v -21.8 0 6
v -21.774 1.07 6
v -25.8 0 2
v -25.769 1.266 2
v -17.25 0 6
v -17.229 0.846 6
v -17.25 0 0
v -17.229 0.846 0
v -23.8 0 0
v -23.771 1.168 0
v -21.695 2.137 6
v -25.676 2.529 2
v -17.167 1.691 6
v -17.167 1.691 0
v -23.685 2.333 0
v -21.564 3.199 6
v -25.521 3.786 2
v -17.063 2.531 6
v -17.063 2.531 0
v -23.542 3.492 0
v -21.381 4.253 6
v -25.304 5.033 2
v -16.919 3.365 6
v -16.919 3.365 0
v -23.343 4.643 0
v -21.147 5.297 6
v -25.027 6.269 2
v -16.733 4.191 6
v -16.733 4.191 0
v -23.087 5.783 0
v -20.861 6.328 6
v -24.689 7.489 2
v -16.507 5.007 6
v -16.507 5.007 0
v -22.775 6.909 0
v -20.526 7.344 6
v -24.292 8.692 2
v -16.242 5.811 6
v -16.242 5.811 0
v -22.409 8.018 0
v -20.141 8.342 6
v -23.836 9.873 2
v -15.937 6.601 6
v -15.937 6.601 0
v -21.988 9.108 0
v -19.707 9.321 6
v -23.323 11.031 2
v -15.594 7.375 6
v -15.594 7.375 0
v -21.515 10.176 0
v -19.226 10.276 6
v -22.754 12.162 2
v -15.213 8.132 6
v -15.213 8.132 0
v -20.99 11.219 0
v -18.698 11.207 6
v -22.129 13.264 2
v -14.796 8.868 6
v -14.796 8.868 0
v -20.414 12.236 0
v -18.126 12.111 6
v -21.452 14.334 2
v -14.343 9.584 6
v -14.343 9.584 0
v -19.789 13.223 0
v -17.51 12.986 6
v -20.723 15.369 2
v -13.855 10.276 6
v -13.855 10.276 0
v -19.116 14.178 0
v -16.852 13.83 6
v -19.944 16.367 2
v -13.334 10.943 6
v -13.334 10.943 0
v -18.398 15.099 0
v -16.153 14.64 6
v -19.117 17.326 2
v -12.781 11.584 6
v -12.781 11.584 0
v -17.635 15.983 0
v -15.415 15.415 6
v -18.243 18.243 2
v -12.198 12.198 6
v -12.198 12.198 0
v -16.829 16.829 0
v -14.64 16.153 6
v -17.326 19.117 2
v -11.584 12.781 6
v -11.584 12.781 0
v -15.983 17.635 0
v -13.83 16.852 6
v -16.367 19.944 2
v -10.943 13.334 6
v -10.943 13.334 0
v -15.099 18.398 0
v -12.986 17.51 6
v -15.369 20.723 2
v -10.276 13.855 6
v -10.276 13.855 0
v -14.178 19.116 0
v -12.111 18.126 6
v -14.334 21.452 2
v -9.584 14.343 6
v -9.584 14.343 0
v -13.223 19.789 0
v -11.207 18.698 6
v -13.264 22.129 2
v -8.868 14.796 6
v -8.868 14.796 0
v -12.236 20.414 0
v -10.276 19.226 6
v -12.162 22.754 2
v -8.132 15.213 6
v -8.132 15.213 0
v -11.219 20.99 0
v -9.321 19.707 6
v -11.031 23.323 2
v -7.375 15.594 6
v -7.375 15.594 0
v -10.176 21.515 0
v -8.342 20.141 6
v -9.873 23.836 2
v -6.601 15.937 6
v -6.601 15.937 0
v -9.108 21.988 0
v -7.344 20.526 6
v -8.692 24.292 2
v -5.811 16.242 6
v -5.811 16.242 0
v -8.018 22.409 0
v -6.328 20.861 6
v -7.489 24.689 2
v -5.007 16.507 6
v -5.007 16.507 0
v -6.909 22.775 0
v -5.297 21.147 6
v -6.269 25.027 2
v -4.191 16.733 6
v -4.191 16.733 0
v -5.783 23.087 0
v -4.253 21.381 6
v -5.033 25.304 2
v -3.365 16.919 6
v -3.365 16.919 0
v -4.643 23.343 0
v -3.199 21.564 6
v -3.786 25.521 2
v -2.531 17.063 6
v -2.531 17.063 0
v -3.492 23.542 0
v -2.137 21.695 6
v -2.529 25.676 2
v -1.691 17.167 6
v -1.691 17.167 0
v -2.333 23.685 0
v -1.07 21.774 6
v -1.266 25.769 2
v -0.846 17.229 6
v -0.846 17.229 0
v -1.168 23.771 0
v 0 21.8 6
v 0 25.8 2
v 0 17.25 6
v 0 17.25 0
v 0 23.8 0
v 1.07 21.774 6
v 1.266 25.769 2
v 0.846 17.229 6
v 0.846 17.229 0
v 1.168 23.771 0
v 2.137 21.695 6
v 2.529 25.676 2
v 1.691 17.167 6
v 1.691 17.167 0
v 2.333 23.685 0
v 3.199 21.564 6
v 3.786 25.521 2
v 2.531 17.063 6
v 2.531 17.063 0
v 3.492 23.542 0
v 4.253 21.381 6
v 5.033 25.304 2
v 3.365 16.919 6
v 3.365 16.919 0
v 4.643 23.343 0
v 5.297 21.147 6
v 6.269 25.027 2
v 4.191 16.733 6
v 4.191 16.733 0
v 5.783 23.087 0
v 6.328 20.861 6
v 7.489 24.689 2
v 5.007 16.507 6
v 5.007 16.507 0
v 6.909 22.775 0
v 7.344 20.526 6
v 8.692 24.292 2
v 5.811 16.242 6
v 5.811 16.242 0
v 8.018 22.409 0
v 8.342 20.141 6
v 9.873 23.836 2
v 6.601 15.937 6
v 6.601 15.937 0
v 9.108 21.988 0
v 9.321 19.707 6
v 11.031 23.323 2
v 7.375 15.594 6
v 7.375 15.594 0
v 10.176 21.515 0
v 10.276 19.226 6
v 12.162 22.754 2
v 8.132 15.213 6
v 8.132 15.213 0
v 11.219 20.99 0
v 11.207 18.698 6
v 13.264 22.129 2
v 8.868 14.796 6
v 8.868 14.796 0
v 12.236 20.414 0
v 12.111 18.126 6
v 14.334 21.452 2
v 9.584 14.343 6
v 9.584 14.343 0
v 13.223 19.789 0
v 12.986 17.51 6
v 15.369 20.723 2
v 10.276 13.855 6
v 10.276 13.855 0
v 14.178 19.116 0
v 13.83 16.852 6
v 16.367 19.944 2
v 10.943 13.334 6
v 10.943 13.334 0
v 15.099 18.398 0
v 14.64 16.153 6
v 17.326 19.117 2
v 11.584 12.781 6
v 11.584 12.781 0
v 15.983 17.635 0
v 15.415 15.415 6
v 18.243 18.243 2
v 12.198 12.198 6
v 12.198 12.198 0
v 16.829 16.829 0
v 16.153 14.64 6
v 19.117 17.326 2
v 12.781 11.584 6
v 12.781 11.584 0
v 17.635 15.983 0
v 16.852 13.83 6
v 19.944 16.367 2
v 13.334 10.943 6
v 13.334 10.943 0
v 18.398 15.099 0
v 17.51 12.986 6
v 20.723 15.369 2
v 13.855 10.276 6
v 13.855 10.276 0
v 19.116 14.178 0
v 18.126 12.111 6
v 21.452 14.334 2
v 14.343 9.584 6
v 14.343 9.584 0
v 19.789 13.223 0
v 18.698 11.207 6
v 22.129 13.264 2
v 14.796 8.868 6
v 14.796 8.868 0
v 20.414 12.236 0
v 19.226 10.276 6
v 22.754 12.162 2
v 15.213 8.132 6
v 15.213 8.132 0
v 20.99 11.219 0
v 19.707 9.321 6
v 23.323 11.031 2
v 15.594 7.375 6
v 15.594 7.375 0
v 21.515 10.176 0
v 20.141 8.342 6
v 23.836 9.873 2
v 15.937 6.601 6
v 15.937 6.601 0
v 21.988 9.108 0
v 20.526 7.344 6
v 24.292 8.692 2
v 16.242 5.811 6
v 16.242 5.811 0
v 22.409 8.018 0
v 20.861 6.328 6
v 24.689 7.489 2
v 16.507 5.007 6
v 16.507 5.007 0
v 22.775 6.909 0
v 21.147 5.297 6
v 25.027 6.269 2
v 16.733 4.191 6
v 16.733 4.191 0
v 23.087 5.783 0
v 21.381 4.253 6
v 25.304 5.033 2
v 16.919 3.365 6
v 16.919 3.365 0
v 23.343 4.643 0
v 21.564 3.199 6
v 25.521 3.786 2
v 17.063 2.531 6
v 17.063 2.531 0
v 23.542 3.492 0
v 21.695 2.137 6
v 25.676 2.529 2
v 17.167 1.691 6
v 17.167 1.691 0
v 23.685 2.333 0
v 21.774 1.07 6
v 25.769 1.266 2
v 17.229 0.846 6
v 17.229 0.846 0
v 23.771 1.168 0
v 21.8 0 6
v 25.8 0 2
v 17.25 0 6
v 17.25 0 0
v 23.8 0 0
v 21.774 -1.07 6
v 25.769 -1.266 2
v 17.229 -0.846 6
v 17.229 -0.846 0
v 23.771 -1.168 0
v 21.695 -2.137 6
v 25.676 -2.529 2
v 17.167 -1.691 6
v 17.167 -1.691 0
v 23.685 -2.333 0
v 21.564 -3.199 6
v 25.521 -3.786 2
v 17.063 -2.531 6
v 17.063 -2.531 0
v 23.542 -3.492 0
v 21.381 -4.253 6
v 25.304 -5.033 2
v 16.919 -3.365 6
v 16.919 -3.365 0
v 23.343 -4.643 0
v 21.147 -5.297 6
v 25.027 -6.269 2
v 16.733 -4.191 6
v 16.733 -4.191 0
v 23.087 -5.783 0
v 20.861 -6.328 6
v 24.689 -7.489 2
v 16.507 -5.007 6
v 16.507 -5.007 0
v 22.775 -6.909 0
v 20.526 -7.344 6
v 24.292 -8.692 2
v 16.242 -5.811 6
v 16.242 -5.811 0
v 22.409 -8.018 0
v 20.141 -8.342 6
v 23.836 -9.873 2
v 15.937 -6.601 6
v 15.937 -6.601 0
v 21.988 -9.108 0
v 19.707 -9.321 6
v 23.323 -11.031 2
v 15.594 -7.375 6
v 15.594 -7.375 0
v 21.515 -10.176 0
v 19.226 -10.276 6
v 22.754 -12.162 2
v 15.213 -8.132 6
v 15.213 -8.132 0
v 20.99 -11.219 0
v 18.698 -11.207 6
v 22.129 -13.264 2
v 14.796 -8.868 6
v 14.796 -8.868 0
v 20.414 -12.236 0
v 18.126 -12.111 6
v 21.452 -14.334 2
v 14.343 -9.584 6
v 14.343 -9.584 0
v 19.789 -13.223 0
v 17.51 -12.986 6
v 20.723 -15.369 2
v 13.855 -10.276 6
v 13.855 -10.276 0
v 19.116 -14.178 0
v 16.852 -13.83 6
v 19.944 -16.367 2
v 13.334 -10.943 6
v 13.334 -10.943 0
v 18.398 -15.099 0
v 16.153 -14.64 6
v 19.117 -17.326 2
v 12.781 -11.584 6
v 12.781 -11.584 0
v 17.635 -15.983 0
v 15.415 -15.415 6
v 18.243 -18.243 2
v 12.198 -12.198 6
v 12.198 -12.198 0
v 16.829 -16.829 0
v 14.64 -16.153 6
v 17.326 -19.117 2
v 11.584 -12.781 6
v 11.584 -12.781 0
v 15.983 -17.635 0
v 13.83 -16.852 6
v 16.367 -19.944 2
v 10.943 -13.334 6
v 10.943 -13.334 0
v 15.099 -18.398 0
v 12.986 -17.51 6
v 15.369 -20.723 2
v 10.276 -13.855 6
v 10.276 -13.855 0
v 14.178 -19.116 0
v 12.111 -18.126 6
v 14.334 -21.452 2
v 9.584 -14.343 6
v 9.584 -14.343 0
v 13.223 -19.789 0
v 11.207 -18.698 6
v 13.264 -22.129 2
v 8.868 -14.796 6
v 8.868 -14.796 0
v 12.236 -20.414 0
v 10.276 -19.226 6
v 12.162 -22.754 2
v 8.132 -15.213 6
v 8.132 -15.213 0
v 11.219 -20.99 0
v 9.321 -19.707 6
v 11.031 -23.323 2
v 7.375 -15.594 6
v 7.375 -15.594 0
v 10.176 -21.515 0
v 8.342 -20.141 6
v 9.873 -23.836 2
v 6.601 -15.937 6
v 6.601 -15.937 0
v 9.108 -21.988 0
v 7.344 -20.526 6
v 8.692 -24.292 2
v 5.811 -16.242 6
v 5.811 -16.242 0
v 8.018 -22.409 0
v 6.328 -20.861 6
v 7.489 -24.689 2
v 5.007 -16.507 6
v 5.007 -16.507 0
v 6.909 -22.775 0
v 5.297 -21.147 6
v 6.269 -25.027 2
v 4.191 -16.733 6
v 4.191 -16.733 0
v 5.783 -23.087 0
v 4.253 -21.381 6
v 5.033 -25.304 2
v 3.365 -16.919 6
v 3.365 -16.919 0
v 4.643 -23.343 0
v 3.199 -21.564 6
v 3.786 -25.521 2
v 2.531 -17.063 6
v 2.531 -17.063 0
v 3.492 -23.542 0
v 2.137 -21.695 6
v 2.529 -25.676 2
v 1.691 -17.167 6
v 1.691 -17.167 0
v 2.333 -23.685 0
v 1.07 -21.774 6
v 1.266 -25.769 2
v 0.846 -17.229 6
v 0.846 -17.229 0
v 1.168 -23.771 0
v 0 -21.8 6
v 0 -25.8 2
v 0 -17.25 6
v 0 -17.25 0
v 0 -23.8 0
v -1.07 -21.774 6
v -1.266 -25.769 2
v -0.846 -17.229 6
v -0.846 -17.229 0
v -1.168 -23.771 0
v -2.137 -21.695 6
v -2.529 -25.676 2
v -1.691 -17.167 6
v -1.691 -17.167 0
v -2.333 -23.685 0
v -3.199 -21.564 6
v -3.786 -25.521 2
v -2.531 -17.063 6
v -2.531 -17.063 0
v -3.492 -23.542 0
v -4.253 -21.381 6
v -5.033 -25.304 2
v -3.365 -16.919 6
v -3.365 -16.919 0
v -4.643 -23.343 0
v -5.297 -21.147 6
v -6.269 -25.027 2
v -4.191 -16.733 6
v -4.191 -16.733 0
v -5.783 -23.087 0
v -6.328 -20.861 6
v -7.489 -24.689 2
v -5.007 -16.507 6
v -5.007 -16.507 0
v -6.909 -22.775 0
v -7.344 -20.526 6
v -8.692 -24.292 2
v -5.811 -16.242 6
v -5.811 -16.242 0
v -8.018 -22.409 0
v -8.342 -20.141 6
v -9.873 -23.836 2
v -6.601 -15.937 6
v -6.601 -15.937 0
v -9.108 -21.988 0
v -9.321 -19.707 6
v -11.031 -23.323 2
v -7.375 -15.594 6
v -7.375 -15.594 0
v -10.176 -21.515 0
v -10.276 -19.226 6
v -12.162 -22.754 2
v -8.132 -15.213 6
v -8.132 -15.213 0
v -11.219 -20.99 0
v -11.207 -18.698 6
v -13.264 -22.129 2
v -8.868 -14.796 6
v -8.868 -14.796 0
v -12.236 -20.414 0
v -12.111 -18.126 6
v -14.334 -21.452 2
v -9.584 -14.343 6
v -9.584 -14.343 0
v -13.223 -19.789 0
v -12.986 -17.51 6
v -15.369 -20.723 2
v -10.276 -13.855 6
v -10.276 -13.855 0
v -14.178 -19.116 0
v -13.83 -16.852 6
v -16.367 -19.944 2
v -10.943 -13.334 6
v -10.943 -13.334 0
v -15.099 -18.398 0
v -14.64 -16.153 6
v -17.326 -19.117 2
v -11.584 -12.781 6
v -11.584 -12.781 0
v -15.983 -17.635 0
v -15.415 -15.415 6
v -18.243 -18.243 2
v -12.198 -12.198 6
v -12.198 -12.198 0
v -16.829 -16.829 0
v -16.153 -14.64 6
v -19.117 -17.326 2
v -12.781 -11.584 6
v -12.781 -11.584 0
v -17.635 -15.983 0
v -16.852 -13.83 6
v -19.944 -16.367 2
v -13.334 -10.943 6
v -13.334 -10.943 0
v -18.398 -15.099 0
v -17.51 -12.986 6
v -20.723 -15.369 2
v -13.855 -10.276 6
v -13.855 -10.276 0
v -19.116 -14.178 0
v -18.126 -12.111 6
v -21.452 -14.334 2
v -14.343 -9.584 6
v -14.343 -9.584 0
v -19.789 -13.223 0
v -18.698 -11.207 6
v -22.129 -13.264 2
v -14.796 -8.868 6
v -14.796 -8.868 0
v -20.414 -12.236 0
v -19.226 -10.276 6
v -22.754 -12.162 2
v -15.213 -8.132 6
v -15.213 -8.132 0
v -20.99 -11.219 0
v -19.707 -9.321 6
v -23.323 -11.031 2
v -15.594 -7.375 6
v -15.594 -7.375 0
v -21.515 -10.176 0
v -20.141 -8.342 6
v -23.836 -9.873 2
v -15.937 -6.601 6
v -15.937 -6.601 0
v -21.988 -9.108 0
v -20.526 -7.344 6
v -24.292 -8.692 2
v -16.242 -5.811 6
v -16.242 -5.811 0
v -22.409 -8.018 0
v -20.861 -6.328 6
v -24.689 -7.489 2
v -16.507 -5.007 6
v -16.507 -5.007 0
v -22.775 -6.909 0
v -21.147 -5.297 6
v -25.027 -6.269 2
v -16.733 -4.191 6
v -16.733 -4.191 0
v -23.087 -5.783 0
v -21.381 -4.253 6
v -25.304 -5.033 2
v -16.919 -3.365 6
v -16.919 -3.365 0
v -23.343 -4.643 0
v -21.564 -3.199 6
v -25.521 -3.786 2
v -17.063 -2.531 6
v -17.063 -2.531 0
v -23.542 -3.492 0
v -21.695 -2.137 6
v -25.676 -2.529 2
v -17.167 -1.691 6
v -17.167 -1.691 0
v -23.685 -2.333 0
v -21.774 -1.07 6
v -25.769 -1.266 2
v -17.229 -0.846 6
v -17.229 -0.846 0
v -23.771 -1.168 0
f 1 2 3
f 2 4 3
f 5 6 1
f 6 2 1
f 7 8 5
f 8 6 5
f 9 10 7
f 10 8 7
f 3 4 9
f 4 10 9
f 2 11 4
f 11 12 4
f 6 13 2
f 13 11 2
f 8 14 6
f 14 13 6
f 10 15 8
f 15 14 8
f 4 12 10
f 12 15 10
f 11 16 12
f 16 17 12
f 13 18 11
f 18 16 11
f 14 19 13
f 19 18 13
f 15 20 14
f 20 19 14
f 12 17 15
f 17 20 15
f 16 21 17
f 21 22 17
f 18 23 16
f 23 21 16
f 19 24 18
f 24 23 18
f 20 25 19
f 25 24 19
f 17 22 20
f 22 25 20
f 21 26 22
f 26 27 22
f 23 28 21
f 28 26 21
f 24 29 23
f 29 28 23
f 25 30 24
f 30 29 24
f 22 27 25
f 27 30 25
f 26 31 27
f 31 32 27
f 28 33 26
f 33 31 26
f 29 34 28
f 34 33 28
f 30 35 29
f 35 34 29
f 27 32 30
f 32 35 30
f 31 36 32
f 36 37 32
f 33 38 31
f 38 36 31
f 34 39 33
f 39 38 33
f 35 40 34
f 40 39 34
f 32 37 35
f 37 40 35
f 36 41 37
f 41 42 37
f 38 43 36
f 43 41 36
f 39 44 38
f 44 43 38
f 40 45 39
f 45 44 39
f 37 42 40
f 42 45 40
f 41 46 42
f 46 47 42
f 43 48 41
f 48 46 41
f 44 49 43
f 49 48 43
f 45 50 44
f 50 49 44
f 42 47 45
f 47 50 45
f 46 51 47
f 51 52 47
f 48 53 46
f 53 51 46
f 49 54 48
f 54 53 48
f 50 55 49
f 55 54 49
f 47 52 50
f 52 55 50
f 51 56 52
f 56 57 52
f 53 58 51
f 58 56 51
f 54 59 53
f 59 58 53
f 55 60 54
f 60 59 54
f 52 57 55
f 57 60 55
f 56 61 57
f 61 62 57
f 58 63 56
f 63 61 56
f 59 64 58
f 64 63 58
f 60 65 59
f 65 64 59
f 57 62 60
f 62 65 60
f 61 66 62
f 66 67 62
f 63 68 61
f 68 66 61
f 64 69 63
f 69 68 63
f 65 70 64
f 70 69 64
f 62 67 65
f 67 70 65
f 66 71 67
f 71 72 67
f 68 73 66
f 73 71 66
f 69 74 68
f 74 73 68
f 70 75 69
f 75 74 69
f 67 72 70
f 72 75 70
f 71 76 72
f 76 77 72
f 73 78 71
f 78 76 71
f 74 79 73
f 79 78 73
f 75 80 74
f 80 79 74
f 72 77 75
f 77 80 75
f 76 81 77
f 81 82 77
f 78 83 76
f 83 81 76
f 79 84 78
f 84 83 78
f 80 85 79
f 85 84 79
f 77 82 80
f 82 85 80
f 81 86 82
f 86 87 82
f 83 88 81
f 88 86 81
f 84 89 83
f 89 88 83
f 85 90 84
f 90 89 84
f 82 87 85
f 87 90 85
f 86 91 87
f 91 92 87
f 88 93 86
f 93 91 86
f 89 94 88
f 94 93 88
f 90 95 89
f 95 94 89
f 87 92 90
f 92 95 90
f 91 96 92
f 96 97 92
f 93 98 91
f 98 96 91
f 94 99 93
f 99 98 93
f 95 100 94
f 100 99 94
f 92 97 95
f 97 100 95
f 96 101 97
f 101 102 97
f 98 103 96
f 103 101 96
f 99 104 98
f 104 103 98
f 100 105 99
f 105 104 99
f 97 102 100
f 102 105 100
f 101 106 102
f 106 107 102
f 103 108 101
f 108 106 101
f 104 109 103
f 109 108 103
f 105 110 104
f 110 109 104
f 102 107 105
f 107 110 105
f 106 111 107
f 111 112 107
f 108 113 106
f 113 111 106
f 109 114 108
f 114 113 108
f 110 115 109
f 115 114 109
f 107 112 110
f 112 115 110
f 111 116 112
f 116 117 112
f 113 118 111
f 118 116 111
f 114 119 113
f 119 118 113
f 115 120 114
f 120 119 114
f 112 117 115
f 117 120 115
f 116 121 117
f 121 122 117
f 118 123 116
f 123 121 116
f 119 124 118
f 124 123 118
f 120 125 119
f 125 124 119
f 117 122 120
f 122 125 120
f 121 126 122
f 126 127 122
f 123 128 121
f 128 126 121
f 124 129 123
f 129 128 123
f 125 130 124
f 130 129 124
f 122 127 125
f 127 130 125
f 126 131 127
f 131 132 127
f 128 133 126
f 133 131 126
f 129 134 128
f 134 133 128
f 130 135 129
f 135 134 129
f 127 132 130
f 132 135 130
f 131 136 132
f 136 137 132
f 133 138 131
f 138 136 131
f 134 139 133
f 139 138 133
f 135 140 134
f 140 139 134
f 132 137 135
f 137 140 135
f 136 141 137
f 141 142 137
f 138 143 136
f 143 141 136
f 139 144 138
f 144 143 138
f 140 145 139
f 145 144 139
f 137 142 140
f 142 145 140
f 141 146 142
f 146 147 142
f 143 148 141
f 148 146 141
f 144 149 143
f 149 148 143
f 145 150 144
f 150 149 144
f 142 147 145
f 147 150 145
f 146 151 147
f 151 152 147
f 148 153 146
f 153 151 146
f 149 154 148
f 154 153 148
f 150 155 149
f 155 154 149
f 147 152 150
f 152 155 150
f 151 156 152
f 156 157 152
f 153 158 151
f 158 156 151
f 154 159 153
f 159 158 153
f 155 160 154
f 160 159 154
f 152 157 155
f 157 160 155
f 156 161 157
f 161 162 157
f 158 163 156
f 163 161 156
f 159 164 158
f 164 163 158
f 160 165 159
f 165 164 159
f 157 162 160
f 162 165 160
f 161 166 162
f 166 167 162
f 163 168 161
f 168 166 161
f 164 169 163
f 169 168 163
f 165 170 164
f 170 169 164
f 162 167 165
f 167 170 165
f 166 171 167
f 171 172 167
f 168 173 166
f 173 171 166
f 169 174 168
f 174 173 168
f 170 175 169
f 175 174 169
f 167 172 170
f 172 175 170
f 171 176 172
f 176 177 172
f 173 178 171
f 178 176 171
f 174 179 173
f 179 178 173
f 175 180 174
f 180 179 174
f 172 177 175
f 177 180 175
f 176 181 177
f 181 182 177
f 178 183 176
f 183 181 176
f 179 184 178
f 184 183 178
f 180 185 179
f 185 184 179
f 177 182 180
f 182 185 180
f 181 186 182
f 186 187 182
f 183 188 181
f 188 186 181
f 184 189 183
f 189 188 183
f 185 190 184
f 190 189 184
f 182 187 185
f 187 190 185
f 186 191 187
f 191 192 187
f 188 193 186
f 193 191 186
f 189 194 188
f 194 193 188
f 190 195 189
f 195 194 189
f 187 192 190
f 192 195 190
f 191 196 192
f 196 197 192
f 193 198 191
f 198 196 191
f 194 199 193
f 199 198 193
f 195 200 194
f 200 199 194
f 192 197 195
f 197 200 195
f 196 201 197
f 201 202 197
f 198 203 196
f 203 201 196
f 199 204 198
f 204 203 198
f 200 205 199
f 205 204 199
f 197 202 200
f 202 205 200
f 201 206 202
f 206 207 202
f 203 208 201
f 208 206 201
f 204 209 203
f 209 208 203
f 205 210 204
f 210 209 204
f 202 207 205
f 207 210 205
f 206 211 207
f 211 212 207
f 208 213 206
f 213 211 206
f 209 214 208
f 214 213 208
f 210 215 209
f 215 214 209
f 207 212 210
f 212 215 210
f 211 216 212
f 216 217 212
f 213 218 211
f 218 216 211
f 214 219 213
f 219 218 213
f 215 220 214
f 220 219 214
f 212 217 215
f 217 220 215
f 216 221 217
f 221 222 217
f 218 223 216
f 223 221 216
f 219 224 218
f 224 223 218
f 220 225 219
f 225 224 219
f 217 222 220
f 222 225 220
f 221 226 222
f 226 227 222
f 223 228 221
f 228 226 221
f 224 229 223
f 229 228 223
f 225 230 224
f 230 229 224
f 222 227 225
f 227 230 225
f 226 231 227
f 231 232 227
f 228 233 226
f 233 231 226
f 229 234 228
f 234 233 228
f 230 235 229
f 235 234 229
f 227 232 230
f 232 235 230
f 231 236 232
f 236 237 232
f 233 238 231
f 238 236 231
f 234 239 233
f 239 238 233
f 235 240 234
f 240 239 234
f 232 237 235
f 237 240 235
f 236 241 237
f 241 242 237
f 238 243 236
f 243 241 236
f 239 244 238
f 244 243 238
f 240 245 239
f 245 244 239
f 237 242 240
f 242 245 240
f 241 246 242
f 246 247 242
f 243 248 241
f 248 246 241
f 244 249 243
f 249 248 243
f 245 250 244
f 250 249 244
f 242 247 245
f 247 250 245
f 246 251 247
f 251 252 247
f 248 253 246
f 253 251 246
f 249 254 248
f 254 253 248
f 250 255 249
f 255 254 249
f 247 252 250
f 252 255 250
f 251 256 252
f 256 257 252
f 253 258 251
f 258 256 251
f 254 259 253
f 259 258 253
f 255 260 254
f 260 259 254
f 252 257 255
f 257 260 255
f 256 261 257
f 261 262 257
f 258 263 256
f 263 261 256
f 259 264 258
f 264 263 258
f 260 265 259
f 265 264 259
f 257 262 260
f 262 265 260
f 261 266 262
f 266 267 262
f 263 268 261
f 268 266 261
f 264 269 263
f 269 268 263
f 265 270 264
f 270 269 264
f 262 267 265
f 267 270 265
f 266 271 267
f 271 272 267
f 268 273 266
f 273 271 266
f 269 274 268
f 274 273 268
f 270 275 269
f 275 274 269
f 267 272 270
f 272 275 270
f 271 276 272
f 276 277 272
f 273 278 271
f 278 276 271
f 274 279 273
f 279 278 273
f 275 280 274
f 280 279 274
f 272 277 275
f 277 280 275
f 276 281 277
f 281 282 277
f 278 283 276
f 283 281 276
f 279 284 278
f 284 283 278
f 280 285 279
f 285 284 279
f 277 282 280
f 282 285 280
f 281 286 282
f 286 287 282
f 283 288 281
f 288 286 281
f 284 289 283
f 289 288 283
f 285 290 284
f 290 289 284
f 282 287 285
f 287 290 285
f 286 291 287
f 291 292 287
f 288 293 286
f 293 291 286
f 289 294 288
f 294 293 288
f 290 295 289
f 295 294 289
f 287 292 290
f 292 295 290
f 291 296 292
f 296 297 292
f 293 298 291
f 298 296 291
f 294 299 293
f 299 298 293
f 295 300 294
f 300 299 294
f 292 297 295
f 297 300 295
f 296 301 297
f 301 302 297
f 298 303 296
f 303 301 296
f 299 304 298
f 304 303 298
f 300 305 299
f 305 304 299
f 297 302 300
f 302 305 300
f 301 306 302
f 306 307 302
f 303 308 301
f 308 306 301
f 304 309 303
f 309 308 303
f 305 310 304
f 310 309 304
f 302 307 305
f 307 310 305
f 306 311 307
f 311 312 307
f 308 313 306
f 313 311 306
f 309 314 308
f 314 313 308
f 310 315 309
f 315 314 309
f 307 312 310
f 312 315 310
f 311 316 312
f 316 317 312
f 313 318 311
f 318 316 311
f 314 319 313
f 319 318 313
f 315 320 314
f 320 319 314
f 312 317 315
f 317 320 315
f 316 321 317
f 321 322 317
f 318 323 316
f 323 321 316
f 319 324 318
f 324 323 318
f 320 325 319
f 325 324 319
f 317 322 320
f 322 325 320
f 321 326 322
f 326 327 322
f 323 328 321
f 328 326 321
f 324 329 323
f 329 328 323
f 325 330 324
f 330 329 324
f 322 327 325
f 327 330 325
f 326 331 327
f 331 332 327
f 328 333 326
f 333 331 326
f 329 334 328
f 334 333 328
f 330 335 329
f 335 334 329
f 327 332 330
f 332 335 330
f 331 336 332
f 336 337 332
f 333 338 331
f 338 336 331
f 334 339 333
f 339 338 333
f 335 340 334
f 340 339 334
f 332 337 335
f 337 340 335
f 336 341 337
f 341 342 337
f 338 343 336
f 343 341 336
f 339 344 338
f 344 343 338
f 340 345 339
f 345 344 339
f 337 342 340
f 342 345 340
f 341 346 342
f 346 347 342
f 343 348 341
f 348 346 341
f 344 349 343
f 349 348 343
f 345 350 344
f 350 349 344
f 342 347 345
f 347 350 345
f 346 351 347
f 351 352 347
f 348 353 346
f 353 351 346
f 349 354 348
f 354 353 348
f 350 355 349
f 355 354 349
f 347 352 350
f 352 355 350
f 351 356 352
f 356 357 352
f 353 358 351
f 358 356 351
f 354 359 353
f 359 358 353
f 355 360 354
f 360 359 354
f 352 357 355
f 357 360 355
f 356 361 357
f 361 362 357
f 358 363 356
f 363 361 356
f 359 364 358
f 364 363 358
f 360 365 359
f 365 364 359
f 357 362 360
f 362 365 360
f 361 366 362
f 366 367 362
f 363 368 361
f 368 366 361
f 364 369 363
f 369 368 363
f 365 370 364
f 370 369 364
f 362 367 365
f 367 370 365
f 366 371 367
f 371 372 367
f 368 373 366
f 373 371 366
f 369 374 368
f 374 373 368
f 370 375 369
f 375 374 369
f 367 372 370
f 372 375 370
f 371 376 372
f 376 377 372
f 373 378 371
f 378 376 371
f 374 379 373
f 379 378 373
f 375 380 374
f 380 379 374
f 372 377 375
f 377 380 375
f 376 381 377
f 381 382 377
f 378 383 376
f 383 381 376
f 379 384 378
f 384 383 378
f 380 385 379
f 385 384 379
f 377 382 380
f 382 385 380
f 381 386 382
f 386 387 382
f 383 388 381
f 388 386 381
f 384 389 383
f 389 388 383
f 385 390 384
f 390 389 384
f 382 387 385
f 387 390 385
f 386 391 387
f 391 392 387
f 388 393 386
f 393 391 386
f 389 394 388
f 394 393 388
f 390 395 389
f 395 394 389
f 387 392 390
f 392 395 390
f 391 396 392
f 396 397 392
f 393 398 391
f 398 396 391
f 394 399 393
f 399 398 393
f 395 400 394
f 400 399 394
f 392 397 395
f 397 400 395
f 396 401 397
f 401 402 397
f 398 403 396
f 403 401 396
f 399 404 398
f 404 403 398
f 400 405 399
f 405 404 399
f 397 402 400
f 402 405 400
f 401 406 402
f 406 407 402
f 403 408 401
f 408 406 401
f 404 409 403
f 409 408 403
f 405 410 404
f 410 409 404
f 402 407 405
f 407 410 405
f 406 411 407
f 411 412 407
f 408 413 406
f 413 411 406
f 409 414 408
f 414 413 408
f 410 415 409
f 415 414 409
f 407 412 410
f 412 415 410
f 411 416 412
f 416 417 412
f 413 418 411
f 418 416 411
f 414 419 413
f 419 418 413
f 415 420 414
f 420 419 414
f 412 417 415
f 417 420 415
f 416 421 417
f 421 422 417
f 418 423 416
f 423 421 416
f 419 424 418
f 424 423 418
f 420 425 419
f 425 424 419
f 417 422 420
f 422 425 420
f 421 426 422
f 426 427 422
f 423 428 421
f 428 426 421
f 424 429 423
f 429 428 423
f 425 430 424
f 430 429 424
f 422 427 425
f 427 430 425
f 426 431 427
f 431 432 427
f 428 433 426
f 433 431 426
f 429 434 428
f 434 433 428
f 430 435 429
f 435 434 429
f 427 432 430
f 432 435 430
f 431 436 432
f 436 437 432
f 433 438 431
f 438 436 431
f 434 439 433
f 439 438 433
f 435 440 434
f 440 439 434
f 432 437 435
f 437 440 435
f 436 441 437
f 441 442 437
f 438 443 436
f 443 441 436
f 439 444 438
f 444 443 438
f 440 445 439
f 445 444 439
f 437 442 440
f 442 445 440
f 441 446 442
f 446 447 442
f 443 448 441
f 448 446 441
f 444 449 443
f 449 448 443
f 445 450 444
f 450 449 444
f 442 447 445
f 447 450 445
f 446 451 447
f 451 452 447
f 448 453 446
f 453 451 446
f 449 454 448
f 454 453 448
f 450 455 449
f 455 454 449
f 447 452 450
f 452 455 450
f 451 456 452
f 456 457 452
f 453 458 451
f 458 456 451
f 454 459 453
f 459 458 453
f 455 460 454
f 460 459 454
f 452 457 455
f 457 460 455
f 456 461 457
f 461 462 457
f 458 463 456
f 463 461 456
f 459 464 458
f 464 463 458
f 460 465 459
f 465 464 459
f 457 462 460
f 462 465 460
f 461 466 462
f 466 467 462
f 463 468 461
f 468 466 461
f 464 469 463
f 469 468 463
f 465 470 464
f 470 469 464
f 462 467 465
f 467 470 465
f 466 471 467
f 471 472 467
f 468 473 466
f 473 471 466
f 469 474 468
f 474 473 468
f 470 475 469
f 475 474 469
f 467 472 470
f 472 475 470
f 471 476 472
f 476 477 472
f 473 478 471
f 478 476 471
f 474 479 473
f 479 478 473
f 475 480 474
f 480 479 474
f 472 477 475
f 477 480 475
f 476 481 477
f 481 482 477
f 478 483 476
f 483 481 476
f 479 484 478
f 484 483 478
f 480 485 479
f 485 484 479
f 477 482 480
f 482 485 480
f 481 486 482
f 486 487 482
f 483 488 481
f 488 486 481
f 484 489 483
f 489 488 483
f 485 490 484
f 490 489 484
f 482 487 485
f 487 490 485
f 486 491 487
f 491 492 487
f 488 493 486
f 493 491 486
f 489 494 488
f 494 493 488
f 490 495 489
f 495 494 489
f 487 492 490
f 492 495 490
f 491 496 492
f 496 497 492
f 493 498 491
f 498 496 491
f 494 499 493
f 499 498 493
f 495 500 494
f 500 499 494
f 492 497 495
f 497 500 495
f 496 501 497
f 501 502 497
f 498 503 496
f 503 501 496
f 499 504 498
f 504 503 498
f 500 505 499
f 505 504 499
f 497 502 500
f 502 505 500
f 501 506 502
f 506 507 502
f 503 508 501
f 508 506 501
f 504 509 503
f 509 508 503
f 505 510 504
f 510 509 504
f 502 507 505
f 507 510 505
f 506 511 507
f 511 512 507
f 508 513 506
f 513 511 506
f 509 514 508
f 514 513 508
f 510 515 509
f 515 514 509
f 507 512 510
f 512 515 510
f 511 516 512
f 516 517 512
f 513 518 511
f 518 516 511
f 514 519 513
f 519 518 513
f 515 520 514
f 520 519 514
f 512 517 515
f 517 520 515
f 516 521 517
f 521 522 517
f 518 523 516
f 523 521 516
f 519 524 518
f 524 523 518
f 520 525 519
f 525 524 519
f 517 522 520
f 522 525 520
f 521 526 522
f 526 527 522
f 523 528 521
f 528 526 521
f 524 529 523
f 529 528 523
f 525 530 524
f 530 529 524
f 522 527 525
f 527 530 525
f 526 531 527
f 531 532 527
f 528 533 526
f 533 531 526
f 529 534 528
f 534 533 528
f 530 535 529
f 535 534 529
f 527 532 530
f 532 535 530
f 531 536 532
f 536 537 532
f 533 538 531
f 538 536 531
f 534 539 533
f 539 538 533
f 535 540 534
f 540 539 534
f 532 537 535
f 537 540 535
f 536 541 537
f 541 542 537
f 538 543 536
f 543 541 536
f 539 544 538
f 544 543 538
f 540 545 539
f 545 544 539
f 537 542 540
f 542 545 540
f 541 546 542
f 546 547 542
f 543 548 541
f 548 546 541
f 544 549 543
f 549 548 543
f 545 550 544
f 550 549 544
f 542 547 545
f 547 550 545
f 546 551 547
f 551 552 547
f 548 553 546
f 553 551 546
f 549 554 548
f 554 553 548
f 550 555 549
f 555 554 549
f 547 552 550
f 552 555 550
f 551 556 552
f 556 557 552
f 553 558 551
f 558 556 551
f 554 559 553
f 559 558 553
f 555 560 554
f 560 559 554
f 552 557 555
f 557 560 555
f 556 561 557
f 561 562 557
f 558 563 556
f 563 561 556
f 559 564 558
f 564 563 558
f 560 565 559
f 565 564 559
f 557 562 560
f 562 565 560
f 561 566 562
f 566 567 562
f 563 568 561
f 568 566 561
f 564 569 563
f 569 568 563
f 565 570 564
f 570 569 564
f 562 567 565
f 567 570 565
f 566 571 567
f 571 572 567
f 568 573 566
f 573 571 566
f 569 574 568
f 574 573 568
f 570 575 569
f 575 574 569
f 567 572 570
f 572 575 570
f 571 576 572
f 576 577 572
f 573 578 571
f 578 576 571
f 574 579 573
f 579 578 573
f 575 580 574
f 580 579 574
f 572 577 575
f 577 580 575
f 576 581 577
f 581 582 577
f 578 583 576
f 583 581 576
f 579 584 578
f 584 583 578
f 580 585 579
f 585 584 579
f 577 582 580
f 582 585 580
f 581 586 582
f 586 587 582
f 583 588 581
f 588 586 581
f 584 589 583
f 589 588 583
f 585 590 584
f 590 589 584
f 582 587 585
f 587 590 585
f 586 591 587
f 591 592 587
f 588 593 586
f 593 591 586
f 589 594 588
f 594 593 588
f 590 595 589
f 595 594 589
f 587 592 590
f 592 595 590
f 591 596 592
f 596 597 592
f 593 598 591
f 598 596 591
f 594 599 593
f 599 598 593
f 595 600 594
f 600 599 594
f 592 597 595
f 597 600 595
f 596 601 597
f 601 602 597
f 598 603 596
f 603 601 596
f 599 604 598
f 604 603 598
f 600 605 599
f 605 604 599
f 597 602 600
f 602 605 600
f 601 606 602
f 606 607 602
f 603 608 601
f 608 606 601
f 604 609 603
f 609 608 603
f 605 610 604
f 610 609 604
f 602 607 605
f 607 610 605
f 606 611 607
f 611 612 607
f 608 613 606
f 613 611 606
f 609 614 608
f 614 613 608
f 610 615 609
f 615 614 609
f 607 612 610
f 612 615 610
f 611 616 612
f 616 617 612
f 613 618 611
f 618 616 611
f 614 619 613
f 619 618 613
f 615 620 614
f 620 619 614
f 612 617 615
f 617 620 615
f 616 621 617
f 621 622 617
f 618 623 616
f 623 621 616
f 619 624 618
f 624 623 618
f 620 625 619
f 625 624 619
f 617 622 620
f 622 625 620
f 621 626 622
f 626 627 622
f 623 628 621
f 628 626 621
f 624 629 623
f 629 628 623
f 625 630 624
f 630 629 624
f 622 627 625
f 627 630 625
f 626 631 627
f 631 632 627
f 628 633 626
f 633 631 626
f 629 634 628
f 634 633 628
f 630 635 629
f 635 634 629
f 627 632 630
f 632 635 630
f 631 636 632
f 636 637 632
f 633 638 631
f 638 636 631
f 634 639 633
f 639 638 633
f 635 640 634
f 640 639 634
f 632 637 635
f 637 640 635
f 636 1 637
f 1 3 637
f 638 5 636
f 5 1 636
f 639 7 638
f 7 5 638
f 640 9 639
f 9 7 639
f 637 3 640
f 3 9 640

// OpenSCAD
//
// Joint d'étanchéité pour bouchon d'évier
// (Gasket for strainer basket)
//
// copyright 2015 Sébastien Roy
//
// Licence: public domain
//


/* [Parameters] */

// Outside diameter (x 1/10 mm)
outsideDiameter=516; // [300:700]

// Inside diameter (x 1/10 mm)
insideDiameter=345; // [200:500]

// Height (x 1/10 mm)
height=60; // [40:80]


//inside=34.5/2;
//outside=51.6/2;
//height=6;
//ep=4;

out=outsideDiameter/20; // radius in mm
in=insideDiameter/20; // radius in mm
h=height/10; // in mm
h1=h*1/3; // height of exterior point from base
h2=h-h1; // height of exterior point from top

echo(h,h1,h2);
echo(in,out);

//             +--+                 --- ---
//             |   ---               h2  |   
//             |      ---            |   |
//             |         +          ---  h
//             |        /            h1  |
//             |       /             |   |
//             +------+             --- ---
//   |... in ..|
//   |... out ............|
//   |... out-h1 .....|
//   |... out-h2 ..|

rotate_extrude($fn=128) {
    polygon([[in,0],[out-h1,0],[out,h1],[out-h2,h],[in,h]]);
}
